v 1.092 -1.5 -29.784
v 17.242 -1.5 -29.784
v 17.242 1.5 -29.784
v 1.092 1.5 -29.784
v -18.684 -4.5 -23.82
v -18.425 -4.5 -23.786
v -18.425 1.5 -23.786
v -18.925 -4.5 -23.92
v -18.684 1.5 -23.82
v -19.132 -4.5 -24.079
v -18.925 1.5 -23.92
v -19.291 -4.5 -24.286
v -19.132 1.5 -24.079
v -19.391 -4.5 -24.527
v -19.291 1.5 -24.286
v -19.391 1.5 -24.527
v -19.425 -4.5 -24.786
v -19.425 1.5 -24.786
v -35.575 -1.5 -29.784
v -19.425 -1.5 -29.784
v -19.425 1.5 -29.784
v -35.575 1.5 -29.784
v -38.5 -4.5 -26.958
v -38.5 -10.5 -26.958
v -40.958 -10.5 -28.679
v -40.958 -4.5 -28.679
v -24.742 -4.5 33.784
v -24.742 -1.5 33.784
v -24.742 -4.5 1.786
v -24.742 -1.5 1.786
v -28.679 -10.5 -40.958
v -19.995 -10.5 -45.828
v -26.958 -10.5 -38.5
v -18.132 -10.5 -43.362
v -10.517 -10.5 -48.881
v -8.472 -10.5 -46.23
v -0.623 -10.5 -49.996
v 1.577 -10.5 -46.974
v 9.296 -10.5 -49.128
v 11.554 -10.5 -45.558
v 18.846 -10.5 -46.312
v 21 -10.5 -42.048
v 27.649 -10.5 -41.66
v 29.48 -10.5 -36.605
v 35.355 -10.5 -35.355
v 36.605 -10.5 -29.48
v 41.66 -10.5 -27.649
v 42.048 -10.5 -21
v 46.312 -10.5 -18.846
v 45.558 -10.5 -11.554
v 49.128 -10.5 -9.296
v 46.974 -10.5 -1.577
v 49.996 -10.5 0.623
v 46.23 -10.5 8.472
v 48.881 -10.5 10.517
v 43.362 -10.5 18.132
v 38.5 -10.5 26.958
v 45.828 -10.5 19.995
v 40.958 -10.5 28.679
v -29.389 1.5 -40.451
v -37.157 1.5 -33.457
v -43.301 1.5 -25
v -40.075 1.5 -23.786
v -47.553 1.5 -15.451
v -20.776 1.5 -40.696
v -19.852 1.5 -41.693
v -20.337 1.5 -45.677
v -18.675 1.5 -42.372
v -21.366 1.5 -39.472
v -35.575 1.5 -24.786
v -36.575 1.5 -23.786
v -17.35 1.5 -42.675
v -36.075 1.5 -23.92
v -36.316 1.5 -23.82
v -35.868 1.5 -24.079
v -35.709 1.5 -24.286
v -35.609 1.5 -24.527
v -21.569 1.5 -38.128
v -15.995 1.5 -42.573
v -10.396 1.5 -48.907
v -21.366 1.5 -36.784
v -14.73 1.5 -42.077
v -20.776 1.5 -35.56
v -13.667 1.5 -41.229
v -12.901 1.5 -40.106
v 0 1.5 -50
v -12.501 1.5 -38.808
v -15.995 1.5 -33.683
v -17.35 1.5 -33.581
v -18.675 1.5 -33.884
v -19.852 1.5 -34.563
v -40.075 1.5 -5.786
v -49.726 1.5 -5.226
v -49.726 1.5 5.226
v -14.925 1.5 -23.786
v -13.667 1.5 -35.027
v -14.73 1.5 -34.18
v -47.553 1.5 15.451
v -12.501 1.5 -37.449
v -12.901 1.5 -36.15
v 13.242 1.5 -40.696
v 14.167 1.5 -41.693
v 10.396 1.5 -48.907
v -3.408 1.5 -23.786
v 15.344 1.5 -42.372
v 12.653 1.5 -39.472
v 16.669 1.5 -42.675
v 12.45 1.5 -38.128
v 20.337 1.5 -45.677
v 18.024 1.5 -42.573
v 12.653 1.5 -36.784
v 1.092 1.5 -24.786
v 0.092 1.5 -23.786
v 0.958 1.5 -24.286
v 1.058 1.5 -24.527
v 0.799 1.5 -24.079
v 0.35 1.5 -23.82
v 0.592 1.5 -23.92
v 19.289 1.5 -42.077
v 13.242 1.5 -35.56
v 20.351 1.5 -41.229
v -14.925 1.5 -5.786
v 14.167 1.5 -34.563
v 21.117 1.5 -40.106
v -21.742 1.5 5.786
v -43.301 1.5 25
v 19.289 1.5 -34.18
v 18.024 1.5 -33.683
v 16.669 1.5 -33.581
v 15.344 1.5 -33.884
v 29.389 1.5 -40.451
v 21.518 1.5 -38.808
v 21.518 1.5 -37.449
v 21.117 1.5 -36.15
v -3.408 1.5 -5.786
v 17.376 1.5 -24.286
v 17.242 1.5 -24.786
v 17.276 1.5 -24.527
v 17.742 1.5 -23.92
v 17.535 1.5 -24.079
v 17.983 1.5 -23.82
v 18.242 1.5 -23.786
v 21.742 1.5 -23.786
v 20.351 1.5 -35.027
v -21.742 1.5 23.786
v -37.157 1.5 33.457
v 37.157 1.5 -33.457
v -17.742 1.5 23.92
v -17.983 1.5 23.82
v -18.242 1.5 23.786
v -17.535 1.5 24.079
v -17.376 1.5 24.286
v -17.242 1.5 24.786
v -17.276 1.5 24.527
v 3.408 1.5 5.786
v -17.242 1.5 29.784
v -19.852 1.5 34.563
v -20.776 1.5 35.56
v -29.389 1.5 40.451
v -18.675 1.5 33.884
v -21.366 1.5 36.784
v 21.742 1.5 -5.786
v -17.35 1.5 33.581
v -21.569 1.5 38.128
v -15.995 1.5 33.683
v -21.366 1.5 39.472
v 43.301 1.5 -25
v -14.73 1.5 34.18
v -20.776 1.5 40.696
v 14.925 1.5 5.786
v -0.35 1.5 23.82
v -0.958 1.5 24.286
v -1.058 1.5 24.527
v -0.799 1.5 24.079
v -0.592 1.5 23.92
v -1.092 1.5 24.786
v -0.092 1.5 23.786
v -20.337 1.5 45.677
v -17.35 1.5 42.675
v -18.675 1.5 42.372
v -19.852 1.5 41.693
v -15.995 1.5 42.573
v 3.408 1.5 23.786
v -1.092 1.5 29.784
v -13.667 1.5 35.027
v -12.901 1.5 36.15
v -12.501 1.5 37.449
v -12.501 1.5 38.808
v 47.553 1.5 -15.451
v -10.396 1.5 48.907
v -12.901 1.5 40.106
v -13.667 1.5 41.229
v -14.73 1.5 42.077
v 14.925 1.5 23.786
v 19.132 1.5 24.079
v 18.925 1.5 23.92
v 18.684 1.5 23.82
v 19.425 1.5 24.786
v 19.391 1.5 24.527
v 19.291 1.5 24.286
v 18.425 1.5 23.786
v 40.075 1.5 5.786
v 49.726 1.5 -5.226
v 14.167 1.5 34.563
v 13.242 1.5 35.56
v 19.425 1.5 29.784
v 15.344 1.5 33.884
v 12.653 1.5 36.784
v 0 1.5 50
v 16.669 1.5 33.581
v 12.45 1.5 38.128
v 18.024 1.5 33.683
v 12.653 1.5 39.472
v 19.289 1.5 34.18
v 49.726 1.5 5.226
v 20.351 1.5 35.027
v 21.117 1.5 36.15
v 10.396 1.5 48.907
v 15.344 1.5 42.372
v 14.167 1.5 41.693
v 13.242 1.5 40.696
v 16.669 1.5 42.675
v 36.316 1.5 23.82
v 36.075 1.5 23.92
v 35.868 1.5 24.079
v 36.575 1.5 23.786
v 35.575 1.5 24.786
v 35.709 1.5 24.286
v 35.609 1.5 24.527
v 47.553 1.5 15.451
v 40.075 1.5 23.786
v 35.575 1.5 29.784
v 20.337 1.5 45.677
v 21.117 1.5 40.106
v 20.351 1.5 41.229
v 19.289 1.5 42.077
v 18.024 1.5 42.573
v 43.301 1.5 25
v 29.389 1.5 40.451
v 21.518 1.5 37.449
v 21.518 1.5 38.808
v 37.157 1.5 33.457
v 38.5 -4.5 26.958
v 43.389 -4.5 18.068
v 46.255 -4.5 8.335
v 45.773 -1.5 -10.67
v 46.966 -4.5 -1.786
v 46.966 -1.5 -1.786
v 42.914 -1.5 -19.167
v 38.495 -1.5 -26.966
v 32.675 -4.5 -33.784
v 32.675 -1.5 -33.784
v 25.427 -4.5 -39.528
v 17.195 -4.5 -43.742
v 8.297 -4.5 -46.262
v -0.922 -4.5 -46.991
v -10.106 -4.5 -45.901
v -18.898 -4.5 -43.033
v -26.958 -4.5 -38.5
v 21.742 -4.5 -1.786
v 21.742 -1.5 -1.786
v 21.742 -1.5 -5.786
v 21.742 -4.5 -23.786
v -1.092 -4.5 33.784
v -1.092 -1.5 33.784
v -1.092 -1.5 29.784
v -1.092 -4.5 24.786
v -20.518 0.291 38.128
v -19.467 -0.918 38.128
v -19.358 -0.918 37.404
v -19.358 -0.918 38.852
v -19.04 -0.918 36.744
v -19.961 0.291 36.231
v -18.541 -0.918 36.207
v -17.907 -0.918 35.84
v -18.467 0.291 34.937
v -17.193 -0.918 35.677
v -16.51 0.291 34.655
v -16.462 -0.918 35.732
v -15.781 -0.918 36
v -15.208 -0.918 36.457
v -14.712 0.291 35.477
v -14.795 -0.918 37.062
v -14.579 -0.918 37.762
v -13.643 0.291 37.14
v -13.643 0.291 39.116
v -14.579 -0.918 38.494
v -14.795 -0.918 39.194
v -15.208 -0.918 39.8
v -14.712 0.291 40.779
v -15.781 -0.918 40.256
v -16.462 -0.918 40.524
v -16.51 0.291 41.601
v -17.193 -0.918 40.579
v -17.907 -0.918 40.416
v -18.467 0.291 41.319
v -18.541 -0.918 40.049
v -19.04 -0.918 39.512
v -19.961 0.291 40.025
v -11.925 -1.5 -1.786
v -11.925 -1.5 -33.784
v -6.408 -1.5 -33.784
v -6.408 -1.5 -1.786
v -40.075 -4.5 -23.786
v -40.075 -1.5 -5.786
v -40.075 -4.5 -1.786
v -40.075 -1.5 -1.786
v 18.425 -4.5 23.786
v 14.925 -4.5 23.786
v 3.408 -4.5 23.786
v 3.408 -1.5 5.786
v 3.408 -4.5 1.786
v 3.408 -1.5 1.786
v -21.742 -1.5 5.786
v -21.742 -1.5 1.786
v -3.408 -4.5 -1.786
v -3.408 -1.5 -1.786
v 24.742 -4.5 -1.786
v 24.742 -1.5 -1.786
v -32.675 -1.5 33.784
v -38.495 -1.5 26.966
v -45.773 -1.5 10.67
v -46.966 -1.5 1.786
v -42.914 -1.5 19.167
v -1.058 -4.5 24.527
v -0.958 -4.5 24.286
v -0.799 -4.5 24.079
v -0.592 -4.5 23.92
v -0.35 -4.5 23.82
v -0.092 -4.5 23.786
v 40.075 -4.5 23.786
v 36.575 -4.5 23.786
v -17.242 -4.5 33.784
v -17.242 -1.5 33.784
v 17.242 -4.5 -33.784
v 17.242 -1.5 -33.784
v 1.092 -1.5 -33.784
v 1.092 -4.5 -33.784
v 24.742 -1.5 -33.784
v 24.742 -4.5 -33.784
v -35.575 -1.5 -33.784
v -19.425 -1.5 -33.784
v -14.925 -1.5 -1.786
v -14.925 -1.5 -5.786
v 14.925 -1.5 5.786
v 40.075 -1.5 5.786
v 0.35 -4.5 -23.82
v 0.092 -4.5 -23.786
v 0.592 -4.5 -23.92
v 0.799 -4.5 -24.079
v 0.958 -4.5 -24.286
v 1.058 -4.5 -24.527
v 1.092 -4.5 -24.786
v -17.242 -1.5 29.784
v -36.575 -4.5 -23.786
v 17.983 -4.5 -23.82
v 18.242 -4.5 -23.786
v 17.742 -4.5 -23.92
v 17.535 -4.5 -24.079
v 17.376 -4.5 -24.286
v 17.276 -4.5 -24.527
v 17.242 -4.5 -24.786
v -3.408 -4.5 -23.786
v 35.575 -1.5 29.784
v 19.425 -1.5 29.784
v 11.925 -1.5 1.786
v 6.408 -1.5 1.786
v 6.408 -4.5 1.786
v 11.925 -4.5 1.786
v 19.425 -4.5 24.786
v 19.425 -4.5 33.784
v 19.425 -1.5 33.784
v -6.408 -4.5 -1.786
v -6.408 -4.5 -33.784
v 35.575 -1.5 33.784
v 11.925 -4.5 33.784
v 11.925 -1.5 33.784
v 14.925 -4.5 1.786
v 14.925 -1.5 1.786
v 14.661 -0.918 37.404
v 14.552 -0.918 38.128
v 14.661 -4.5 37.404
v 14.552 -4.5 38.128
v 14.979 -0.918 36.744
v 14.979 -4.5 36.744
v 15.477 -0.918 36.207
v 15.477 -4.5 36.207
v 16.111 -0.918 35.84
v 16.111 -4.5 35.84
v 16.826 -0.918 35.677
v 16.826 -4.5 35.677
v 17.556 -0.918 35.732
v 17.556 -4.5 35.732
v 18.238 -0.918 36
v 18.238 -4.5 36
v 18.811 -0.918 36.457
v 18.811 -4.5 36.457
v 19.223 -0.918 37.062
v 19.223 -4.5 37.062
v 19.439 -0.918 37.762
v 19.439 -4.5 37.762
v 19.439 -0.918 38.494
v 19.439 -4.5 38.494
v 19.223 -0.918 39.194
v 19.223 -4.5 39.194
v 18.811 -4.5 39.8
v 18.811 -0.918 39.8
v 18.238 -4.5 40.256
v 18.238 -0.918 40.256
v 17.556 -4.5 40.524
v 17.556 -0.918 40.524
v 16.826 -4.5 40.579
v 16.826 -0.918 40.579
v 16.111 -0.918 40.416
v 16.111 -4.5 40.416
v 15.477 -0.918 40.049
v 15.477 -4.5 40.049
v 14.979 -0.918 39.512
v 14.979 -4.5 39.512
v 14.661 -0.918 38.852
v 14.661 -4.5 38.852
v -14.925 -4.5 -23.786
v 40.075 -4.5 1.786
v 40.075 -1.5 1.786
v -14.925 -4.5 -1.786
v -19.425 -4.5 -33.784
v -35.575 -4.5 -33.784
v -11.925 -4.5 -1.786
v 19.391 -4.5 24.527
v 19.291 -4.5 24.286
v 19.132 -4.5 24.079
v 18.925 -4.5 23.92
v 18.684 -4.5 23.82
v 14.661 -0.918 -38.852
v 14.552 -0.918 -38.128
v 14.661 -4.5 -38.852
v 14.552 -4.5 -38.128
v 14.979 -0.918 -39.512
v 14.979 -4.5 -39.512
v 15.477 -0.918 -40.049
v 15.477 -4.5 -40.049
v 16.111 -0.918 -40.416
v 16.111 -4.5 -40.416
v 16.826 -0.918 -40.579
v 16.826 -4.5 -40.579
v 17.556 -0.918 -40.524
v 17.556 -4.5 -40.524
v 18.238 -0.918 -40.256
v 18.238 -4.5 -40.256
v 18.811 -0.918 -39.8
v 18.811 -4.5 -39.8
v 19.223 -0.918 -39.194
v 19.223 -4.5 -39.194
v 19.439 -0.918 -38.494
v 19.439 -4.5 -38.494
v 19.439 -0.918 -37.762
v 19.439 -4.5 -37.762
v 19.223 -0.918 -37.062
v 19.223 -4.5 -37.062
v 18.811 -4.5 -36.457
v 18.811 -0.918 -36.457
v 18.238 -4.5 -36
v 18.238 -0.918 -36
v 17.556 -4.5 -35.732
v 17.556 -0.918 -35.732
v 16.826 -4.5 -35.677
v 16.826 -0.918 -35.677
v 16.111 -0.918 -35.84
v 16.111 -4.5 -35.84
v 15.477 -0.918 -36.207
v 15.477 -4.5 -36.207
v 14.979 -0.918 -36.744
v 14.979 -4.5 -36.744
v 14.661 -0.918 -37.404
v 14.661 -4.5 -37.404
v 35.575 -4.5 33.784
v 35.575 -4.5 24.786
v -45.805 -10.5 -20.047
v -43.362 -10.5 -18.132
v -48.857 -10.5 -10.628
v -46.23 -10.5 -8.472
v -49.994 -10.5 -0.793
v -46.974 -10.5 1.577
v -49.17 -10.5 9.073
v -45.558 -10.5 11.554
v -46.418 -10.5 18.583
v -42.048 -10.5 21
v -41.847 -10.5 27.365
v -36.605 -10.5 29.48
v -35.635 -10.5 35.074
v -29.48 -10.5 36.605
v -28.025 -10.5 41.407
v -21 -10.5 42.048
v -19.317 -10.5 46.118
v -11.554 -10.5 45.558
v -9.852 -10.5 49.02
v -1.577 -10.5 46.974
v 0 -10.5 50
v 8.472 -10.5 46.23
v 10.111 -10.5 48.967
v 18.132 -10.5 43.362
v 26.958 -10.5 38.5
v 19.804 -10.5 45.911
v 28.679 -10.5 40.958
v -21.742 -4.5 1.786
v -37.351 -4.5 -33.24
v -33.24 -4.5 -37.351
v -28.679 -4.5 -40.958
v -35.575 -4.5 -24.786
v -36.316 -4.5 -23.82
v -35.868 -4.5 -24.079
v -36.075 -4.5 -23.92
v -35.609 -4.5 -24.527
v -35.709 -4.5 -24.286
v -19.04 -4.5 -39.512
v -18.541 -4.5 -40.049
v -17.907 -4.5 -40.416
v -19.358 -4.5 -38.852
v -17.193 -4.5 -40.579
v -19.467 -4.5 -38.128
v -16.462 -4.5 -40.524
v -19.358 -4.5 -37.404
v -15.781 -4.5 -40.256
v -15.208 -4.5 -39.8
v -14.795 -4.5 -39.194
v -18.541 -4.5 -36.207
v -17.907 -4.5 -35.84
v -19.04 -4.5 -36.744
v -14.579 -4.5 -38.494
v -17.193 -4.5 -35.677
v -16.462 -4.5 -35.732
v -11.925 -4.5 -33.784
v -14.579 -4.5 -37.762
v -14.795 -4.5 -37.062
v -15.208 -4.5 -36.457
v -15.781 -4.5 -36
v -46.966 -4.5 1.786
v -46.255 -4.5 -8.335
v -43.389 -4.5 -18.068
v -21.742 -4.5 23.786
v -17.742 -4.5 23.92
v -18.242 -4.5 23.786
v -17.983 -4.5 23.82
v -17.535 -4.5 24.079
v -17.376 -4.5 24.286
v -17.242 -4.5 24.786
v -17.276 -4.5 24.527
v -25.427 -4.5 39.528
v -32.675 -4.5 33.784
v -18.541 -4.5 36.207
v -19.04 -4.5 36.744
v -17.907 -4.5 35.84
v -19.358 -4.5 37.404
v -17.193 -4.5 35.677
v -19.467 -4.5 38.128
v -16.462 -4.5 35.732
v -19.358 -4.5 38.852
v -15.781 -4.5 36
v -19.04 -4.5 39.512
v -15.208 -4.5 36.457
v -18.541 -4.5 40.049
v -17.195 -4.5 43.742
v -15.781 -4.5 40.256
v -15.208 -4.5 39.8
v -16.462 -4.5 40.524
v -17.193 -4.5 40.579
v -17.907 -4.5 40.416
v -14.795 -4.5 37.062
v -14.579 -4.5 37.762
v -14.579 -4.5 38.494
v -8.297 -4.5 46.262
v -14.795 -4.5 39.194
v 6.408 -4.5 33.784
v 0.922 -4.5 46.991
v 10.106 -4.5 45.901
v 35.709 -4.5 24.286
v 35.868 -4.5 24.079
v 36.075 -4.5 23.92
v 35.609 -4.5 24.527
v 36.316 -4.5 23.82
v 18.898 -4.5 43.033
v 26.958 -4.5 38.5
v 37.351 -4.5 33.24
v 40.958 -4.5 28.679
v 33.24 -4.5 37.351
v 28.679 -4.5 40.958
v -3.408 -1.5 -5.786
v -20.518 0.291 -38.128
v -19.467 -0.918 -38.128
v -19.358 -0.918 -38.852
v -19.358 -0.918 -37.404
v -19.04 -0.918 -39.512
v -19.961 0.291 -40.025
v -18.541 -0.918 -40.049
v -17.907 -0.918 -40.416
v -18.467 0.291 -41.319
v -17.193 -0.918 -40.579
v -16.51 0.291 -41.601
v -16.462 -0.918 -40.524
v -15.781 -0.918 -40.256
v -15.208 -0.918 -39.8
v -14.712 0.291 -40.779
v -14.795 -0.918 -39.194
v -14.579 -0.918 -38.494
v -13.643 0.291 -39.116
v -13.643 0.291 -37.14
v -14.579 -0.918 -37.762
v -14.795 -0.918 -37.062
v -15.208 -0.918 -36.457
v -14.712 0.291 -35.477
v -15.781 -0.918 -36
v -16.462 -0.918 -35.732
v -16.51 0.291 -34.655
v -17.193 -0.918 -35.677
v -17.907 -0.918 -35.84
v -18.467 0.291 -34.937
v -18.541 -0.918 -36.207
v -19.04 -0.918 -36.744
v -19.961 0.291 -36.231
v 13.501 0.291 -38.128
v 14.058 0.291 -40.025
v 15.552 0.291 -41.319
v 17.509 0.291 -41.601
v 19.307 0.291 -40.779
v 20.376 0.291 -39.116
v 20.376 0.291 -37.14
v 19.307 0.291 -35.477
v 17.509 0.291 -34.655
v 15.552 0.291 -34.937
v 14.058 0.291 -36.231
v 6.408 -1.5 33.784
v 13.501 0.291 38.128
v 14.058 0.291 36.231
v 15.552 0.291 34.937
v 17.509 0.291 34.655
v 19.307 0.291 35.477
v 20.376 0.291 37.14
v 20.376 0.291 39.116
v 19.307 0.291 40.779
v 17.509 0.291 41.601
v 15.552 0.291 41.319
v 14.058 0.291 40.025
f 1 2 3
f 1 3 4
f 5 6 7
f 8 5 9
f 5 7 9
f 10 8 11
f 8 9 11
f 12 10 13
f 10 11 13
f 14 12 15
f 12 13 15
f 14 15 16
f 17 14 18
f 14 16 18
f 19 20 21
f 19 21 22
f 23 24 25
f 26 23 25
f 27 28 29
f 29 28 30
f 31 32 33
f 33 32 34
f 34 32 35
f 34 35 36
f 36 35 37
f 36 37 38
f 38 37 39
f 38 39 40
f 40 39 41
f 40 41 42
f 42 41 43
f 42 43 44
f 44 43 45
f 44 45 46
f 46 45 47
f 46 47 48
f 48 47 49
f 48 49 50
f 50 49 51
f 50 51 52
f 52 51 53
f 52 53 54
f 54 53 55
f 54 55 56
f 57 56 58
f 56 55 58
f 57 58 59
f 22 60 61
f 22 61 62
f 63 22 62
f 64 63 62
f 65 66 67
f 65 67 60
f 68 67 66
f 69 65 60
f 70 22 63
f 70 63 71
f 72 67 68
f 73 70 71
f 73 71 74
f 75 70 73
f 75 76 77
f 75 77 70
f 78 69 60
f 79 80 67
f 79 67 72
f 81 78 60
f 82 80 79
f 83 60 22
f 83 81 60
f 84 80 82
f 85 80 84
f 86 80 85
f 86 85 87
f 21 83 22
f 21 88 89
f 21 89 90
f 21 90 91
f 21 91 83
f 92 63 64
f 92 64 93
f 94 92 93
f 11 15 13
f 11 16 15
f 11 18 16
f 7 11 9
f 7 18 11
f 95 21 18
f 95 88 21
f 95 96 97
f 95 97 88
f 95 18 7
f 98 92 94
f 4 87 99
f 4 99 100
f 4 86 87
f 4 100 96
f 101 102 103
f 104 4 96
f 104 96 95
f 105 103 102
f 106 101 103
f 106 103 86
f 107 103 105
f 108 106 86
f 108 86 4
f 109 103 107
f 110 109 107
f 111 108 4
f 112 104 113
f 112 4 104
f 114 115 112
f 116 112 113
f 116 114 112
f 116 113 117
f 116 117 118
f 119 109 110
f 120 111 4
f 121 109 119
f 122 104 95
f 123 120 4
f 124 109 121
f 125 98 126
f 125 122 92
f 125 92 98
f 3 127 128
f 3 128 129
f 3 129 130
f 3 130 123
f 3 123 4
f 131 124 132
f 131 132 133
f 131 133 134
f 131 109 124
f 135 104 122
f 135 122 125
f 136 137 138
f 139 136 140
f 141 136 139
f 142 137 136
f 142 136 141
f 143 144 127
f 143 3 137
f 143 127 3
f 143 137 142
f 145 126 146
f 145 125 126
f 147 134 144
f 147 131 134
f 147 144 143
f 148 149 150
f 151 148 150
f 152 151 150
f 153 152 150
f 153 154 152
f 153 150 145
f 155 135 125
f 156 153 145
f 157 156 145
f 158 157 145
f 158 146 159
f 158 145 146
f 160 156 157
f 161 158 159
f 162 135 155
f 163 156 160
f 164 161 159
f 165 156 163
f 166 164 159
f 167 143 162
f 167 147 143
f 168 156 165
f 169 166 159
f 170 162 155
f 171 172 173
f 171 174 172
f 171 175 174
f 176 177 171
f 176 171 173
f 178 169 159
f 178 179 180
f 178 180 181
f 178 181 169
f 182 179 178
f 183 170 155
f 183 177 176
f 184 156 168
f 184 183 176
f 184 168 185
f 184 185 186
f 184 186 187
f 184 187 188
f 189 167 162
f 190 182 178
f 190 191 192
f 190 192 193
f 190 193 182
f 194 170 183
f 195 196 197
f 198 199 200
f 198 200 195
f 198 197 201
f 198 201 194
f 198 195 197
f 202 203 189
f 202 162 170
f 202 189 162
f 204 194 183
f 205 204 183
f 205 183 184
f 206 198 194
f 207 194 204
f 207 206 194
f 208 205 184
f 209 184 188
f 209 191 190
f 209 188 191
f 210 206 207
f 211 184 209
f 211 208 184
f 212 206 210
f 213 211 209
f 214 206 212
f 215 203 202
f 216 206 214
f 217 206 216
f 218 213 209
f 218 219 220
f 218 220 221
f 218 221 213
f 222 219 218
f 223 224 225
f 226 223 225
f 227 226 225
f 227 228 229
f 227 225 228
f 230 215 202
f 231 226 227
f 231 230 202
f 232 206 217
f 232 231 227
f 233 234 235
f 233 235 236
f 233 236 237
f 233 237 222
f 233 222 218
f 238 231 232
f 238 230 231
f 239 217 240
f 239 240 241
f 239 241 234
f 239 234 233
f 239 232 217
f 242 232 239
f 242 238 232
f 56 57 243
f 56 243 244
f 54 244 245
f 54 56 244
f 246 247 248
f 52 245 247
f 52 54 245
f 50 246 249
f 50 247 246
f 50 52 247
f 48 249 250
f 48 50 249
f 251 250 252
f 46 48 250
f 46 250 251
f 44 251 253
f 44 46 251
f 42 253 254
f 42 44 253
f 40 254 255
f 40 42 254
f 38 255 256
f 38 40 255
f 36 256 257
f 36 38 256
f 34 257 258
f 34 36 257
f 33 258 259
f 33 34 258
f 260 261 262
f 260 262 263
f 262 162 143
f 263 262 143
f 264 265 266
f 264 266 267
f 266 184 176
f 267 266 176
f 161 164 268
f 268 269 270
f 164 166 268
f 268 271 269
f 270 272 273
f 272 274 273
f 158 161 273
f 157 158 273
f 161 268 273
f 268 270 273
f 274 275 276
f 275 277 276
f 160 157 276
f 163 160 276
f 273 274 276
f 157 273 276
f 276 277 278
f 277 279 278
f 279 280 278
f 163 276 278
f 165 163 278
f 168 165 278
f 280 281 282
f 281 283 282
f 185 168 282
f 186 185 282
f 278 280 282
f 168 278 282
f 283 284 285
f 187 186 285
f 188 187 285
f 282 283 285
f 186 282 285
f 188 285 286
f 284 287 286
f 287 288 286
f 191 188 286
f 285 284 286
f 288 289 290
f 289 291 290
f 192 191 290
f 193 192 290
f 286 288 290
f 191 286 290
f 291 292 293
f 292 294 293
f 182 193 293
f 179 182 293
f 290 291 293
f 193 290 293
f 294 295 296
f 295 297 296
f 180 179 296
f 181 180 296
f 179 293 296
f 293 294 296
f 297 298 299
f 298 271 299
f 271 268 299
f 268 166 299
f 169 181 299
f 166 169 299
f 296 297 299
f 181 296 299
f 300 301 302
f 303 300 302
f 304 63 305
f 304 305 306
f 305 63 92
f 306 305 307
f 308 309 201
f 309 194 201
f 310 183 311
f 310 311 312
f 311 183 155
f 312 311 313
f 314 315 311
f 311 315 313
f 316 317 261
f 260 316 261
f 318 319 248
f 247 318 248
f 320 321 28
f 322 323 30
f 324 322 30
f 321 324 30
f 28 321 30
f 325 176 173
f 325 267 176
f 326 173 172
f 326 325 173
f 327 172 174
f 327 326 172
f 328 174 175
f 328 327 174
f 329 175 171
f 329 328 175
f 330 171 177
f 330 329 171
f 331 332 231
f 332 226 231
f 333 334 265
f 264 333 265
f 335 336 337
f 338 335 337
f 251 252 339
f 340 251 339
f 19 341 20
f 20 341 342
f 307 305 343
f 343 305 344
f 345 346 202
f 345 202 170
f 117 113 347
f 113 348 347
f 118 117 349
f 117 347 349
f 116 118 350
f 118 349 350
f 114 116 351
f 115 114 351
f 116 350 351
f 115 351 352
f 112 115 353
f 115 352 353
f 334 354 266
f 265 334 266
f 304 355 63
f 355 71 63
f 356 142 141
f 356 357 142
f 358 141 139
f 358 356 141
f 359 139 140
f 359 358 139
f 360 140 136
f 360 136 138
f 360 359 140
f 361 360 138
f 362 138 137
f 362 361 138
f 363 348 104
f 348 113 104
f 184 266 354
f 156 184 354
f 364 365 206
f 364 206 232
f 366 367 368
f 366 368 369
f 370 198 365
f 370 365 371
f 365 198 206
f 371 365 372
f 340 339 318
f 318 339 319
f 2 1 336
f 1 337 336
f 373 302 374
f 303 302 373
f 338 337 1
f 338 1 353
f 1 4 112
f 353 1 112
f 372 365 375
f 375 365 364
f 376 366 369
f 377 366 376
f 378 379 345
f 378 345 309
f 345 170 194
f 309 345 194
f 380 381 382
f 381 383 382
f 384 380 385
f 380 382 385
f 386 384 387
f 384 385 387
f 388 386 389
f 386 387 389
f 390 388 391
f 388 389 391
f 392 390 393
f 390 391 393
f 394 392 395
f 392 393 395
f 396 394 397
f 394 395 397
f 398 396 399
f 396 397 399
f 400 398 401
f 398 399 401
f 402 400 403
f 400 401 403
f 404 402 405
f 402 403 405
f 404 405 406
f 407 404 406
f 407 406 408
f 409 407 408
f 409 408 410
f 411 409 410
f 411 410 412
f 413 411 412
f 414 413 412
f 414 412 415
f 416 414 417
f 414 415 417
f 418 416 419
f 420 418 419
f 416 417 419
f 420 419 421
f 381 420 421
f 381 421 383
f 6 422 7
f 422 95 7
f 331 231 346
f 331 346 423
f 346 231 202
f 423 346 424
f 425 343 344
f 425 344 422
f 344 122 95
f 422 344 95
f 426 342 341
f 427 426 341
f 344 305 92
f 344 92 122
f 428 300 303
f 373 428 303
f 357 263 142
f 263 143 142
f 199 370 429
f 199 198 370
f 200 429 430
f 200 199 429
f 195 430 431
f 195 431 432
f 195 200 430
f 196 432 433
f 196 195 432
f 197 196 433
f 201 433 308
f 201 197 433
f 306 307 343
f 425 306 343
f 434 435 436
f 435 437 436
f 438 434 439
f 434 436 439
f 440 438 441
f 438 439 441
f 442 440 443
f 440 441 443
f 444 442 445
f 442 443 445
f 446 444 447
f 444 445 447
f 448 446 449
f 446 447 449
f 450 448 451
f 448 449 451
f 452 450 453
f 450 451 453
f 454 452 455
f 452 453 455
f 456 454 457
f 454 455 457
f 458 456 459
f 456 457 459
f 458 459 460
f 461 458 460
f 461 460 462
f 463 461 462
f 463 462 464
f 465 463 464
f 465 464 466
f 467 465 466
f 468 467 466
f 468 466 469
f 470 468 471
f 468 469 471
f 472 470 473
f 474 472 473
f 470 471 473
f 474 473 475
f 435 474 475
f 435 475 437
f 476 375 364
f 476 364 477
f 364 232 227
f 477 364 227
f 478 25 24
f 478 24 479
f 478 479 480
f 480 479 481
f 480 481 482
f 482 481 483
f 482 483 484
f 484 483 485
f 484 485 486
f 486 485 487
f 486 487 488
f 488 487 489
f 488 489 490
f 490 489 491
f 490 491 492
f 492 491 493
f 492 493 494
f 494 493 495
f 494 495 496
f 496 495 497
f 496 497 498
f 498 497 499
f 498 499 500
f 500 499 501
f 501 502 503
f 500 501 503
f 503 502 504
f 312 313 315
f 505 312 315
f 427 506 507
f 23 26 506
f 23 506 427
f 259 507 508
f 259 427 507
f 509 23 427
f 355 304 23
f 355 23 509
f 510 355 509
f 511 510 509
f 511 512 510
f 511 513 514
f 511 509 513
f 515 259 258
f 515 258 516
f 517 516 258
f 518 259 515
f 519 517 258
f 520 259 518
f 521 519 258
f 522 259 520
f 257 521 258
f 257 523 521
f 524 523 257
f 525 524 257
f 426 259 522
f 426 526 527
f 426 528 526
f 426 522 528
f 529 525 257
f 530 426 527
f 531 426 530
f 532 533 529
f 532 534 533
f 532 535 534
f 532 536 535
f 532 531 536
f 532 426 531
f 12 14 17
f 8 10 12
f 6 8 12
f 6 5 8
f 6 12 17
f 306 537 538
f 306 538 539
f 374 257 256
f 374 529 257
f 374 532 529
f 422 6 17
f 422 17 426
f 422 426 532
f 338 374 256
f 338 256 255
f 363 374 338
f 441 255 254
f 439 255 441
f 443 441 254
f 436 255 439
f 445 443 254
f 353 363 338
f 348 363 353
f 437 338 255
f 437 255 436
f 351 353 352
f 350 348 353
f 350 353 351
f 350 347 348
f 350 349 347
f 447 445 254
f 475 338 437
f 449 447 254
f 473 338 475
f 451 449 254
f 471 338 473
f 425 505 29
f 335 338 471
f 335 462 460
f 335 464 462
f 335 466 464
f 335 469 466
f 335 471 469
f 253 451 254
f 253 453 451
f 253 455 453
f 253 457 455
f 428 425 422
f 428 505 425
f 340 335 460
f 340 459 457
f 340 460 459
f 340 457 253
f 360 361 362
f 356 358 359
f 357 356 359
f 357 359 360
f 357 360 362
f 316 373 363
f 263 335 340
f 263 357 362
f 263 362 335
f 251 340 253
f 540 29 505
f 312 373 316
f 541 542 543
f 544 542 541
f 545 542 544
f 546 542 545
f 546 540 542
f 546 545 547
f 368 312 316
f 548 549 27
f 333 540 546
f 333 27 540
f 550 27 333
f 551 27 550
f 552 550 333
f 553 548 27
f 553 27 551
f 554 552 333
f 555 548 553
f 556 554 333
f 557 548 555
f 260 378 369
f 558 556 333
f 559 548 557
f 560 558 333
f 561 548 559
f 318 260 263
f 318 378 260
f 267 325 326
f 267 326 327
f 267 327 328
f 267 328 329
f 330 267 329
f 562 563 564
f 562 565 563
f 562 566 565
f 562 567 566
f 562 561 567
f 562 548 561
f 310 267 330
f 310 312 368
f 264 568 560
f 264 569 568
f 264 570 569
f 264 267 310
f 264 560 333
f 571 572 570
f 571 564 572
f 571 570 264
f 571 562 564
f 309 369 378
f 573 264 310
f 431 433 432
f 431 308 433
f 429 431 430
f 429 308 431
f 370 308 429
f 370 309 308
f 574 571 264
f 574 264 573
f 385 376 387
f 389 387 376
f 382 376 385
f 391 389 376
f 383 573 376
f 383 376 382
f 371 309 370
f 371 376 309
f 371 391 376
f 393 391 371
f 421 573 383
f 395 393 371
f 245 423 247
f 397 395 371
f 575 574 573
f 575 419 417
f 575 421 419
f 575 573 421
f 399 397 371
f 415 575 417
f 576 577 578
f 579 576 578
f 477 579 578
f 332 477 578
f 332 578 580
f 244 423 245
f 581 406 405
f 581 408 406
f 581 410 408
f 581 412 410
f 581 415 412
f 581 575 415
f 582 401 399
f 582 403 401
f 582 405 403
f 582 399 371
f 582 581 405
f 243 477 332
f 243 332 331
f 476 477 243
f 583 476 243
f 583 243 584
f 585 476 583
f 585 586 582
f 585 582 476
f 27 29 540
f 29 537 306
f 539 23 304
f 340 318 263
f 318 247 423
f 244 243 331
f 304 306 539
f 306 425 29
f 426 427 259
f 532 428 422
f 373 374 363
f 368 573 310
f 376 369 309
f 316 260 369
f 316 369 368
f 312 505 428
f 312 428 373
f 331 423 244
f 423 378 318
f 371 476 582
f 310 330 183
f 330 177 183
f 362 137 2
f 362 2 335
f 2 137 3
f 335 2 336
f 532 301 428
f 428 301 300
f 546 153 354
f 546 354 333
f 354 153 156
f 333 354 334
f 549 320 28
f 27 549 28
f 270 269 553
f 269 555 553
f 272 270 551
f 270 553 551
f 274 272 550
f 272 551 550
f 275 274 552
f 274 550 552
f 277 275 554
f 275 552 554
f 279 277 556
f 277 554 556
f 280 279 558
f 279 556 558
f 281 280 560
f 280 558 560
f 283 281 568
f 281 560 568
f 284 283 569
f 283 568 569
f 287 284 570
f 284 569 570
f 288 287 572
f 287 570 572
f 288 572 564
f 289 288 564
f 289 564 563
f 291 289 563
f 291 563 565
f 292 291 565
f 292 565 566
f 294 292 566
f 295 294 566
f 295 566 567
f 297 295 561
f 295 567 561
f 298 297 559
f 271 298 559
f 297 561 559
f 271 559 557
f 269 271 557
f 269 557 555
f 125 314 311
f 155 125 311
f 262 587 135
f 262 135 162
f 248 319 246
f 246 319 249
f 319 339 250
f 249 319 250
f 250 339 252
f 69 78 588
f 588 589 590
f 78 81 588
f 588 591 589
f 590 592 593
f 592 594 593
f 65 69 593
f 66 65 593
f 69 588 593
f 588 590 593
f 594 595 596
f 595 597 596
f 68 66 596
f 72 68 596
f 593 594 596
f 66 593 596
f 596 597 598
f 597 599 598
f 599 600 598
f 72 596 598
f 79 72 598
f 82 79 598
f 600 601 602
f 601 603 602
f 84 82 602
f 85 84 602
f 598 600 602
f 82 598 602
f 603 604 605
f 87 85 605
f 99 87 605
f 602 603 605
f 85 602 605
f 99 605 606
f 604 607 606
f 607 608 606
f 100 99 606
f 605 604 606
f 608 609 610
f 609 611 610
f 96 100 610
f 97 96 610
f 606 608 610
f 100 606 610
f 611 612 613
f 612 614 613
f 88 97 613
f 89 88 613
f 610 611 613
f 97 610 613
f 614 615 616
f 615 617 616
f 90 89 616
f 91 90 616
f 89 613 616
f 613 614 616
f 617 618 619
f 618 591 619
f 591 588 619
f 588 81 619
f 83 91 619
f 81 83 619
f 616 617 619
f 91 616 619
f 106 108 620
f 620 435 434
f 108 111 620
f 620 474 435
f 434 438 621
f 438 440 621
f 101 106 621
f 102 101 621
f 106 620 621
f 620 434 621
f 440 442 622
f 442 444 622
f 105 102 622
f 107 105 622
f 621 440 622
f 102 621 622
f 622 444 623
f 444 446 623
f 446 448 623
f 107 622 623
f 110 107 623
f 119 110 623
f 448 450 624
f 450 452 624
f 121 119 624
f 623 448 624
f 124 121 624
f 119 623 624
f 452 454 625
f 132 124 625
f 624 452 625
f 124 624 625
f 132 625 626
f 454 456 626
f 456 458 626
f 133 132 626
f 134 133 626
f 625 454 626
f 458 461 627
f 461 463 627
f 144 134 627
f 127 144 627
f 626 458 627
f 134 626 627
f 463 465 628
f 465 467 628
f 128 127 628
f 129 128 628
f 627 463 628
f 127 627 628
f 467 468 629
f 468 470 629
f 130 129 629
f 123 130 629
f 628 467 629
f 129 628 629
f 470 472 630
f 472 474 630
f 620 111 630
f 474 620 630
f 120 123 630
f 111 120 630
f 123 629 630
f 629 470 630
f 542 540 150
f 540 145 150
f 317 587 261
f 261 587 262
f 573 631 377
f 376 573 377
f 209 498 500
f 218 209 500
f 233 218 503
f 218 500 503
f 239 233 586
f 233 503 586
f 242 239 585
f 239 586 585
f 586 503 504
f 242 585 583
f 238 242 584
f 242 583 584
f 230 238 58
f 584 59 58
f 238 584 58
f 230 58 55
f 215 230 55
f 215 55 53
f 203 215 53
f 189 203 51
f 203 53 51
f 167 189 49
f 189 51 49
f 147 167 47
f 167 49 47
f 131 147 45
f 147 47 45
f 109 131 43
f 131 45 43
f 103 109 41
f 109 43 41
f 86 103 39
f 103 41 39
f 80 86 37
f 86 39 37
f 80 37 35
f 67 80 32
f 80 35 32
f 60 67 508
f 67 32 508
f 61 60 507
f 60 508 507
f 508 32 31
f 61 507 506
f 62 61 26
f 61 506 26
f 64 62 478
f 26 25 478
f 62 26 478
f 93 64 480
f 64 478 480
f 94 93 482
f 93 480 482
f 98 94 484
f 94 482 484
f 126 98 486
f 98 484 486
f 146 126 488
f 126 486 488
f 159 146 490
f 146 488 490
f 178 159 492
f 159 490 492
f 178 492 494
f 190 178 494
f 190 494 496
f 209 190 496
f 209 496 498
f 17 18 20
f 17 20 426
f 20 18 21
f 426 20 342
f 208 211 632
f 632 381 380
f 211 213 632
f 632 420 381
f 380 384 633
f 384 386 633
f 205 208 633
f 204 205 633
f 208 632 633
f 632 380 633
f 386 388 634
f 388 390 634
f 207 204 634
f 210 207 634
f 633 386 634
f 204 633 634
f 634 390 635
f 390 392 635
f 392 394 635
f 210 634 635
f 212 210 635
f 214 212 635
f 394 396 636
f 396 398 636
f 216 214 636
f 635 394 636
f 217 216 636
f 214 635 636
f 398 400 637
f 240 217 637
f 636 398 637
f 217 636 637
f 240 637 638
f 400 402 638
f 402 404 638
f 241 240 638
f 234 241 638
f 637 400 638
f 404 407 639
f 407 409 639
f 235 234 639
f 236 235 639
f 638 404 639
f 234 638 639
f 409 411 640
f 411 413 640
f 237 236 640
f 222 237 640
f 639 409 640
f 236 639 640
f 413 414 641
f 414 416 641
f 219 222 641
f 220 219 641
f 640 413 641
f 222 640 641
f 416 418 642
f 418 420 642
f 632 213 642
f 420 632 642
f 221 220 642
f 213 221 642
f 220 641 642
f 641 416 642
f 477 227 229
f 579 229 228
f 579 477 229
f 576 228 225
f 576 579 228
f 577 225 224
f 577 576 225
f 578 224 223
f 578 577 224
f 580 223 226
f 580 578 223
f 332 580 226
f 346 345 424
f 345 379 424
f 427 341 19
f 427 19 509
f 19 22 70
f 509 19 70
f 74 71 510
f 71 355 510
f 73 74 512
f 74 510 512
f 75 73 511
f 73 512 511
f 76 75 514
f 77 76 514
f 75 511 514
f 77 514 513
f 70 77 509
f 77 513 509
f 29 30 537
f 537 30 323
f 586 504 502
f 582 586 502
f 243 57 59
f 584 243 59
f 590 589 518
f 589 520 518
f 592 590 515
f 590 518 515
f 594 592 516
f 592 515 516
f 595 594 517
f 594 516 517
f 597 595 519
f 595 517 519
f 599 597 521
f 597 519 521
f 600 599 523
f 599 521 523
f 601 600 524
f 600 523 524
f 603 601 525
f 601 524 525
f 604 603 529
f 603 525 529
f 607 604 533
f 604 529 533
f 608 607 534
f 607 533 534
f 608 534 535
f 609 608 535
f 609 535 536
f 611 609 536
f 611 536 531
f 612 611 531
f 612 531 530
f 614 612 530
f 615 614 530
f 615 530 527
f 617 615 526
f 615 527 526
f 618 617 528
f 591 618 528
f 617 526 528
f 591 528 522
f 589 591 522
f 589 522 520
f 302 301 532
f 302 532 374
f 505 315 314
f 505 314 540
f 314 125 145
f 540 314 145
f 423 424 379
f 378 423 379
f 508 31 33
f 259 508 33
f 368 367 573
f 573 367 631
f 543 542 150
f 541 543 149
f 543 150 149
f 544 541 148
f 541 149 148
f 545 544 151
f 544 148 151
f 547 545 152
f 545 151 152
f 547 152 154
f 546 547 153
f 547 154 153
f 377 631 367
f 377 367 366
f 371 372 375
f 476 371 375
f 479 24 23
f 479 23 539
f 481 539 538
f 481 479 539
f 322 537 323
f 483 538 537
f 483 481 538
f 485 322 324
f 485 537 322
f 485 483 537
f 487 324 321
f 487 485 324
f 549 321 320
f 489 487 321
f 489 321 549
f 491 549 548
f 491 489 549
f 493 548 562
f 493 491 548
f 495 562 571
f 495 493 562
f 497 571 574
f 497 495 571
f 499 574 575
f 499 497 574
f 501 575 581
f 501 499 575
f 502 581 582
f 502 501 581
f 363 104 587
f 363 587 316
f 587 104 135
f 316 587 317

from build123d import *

# Parameters (mm, degrees)
A_BASE_T_START                                    = -1.5
A_BASE_T_OUTLINE_R                                = 47
A_BASE_T_OUTLINE_R_2                              = 1
A_BASE_T_DEPTH                                    = 3
OUTER_START                                       = -12
SKETCH2_R                                         = 50
SKETCH2_R_2                                       = 47
OUTER_RING_DEPTH                                  = 12
FINGER_BASE_THROUGH_HOLES_DEPTH                   = 72.281133549
RING_EXTRUDE_OUTLINE_R                            = 1
RING_EXTRUDE_OUTLINE_W                            = 5.516666665
RING_EXTRUDE_OUTLINE_H                            = 31.998521247
RING_EXTRUDE_OUTLINE_W_2                          = 5.516666664
RING_EXTRUDE_DEPTH                                = 3
SKETCH6_W                                         = 16.15
SKETCH6_H                                         = 4
ALLOWANCE_CUT_1_DEPTH                             = 72.281133549
ALLOWANCE_CUT_2_DEPTH                             = 6
CSK_FOR_8_FLAT_HEAD_SOCKET_CAP_SCREW1_D           = 4.9149
CSK_FOR_8_FLAT_HEAD_SOCKET_CAP_SCREW1_CSINK_D     = 9.1186
CSK_FOR_8_FLAT_HEAD_SOCKET_CAP_SCREW1_CSINK_ANGLE = 82
CLEARANCE_CONTOURING_R                            = 1


# Read off the part's stored shape, not the designer's step: a_base_t, Ring Extrude
with BuildPart() as part:
    # a_base_t outline → a_base_t (new body)
    with BuildSketch(Plane(origin=(0, 0, 0), x_dir=(1, 0, 0), z_dir=(0, 1, 0)).offset(A_BASE_T_START)):
        Circle(A_BASE_T_OUTLINE_R)
        with Locations((-17.009259258, -38.128042167)):
            Circle(A_BASE_T_OUTLINE_R_2, mode=Mode.SUBTRACT)
        with Locations((-9.166666665, -28.284271247)):
            Circle(A_BASE_T_OUTLINE_R_2, mode=Mode.SUBTRACT)
        with Locations((17.009259258, -38.128042167)):
            Circle(A_BASE_T_OUTLINE_R_2, mode=Mode.SUBTRACT)
        with Locations((27.5, -28.284271247)):
            Circle(A_BASE_T_OUTLINE_R_2, mode=Mode.SUBTRACT)
        with Locations((-27.5, 28.284271247)):
            Circle(A_BASE_T_OUTLINE_R_2, mode=Mode.SUBTRACT)
        with Locations((-17.009259258, 38.128042167)):
            Circle(A_BASE_T_OUTLINE_R_2, mode=Mode.SUBTRACT)
        with Locations((9.166666665, 28.284271247)):
            Circle(A_BASE_T_OUTLINE_R_2, mode=Mode.SUBTRACT)
        with Locations((17.009259258, 38.128042167)):
            Circle(A_BASE_T_OUTLINE_R_2, mode=Mode.SUBTRACT)
    extrude(amount=A_BASE_T_DEPTH)

    # Sketch2 → Outer Ring (add)
    with BuildSketch(Plane(origin=(0, 1.5, 0), x_dir=(1, 0, 0), z_dir=(0, 1, 0)).offset(OUTER_START)):
        with Locations(Location((0, 0, 0), (0, 0, 270))):
            Circle(SKETCH2_R)
        with Locations(Location((0, 0, 0), (0, 0, 270))):
            Circle(SKETCH2_R_2, mode=Mode.SUBTRACT)
    extrude(amount=OUTER_RING_DEPTH)

    # Sketch3 → Finger Base Through Holes (cut, through all)
    with BuildSketch(Plane.XZ.offset(1.5)):
        Polygon((35.574999997, 23.78575), (40.074999997, 23.78575), (40.074999997, 5.78575), (14.924999997, 5.78575), (14.924999997, 23.78575), (19.424999997, 23.78575), (19.424999997, 29.784271247), (35.574999997, 29.784271247), align=None)
        Polygon((-1.091666667, 29.784271247), (-17.241666667, 29.784271247), (-17.241666667, 23.78575), (-21.741666667, 23.78575), (-21.741666667, 5.78575), (3.408333333, 5.78575), (3.408333333, 23.78575), (-1.091666667, 23.78575), align=None)
        Polygon((17.241666665, -29.784271247), (1.091666665, -29.784271247), (1.091666665, -23.78575), (-3.408333335, -23.78575), (-3.408333335, -5.78575), (21.741666665, -5.78575), (21.741666665, -23.78575), (17.241666665, -23.78575), align=None)
        Polygon((-19.425, -29.784271247), (-35.575, -29.784271247), (-35.575, -23.78575), (-40.075, -23.78575), (-40.075, -5.78575), (-14.925, -5.78575), (-14.925, -23.78575), (-19.425, -23.78575), align=None)
    extrude(amount=-FINGER_BASE_THROUGH_HOLES_DEPTH, mode=Mode.SUBTRACT)

    # Ring Extrude outline → Ring Extrude (add)
    with BuildSketch(Plane.XZ.offset(1.5)):
        with BuildLine():
            Line((35.574999997, 30.715132674), (35.574999997, 23.78575))
            Line((35.574999997, 23.78575), (40.074999997, 23.78575))
            Line((40.074999997, 23.78575), (40.074999997, 1.78575))
            Line((40.074999997, 1.78575), (14.924999997, 1.78575))
            Line((14.924999997, 1.78575), (14.924999997, 23.78575))
            Line((14.924999997, 23.78575), (19.424999997, 23.78575))
            Line((19.424999997, 23.78575), (19.424999997, 33.784271247))
            Line((19.424999997, 33.784271247), (32.67450101, 33.784271247))
            ThreePointArc((32.67450101, 33.784271247), (0, 47), (-32.67450101, 33.784271247))
            Line((-32.67450101, 33.784271247), (-24.741666667, 33.784271247))
            Line((-24.741666667, 33.784271247), (-24.741666667, 1.78575))
            Line((-24.741666667, 1.78575), (-46.966063247, 1.78575))
            ThreePointArc((-46.966063247, 1.78575), (-44.354634753, -15.545622403), (-35.575, -30.715132671))
            Line((-35.575, -30.715132671), (-35.575, -23.78575))
            Line((-35.575, -23.78575), (-40.075, -23.78575))
            Line((-40.075, -23.78575), (-40.075, -1.78575))
            Line((-40.075, -1.78575), (-14.925, -1.78575))
            Line((-14.925, -1.78575), (-14.925, -23.78575))
            Line((-14.925, -23.78575), (-19.425, -23.78575))
            Line((-19.425, -23.78575), (-19.425, -33.784271247))
            Line((-19.425, -33.784271247), (-32.67450101, -33.784271247))
            ThreePointArc((-32.67450101, -33.784271247), (0, -47), (32.67450101, -33.784271247))
            Line((32.67450101, -33.784271247), (24.741666665, -33.784271247))
            Line((24.741666665, -33.784271247), (24.741666665, -1.78575))
            Line((24.741666665, -1.78575), (46.966063247, -1.78575))
            ThreePointArc((46.966063247, -1.78575), (44.354634753, 15.545622405), (35.574999997, 30.715132674))
        make_face()
        with Locations((-17.009259258, -38.128042167)):
            Circle(RING_EXTRUDE_OUTLINE_R, mode=Mode.SUBTRACT)
        with Locations((-9.166666667, -17.785010623)):
            Rectangle(RING_EXTRUDE_OUTLINE_W, RING_EXTRUDE_OUTLINE_H, mode=Mode.SUBTRACT)
        with Locations((17.009259258, -38.128042167)):
            Circle(RING_EXTRUDE_OUTLINE_R, mode=Mode.SUBTRACT)
        Polygon((17.241666665, -23.78575), (17.241666665, -33.784271247), (1.091666665, -33.784271247), (1.091666665, -23.78575), (-3.408333335, -23.78575), (-3.408333335, -1.78575), (21.741666665, -1.78575), (21.741666665, -23.78575), align=None, mode=Mode.SUBTRACT)
        Polygon((-1.091666667, 23.78575), (3.408333333, 23.78575), (3.408333333, 1.78575), (-21.741666667, 1.78575), (-21.741666667, 23.78575), (-17.241666667, 23.78575), (-17.241666667, 33.784271247), (-1.091666667, 33.784271247), align=None, mode=Mode.SUBTRACT)
        with Locations((-17.009259258, 38.128042167)):
            Circle(RING_EXTRUDE_OUTLINE_R, mode=Mode.SUBTRACT)
        with Locations((9.166666665, 17.785010623)):
            Rectangle(RING_EXTRUDE_OUTLINE_W_2, RING_EXTRUDE_OUTLINE_H, mode=Mode.SUBTRACT)
        with Locations((17.009259258, 38.128042167)):
            Circle(RING_EXTRUDE_OUTLINE_R, mode=Mode.SUBTRACT)
    extrude(amount=RING_EXTRUDE_DEPTH)

    # Sketch6 → Allowance Cut 1 (cut, through all)
    with BuildSketch(Plane.XZ.offset(1.5)):
        with Locations((27.499999997, 31.784271247)):
            Rectangle(SKETCH6_W, SKETCH6_H)
        with Locations((-27.5, -31.784271247)):
            Rectangle(SKETCH6_W, SKETCH6_H)
    extrude(amount=ALLOWANCE_CUT_1_DEPTH, mode=Mode.SUBTRACT)

    # Sketch7 → Allowance Cut 2 (cut)
    with BuildSketch(Plane.XZ.offset(10.5)):
        with BuildLine():
            Line((-38.500146082, -26.958092508), (-40.957602214, -28.678821818))
            ThreePointArc((-40.957602214, -28.678821818), (-35.355339059, -35.355339059), (-28.678821818, -40.957602214))
            Line((-28.678821818, -40.957602214), (-26.958092508, -38.500146082))
            ThreePointArc((-26.958092508, -38.500146082), (-29.909386843, -36.25504901), (-32.67450101, -33.784271247))
            Line((-32.67450101, -33.784271247), (-35.575, -33.784271247))
            Line((-35.575, -33.784271247), (-35.575, -30.715132671))
            ThreePointArc((-35.575, -30.715132671), (-37.085181063, -28.873679114), (-38.500146082, -26.958092508))
        make_face()
        with BuildLine():
            ThreePointArc((40.957602214, 28.678821818), (35.355339059, 35.355339059), (28.678821818, 40.957602214))
            Line((28.678821818, 40.957602214), (26.958092508, 38.500146082))
            ThreePointArc((26.958092508, 38.500146082), (29.909386843, 36.25504901), (32.67450101, 33.784271247))
            Line((32.67450101, 33.784271247), (35.574999997, 33.784271247))
            Line((35.574999997, 33.784271247), (35.574999997, 30.715132674))
            ThreePointArc((35.574999997, 30.715132674), (37.085181061, 28.873679115), (38.500146082, 26.958092508))
            Line((38.500146082, 26.958092508), (40.957602214, 28.678821818))
        make_face()
    extrude(amount=-ALLOWANCE_CUT_2_DEPTH, mode=Mode.SUBTRACT)

    # CSK for #8 Flat Head Socket Cap Screw1 (through all)
    with Locations(Plane(origin=(0, 1.5, 0), x_dir=(1, 0, 0), z_dir=(0, 1, 0))):
        with Locations((-17.009259258, -38.128042167), (17.009259258, -38.128042167), (17.009259258, 38.128042167), (-17.009259258, 38.128042167)):
            CounterSinkHole(CSK_FOR_8_FLAT_HEAD_SOCKET_CAP_SCREW1_D / 2, CSK_FOR_8_FLAT_HEAD_SOCKET_CAP_SCREW1_CSINK_D / 2, counter_sink_angle=CSK_FOR_8_FLAT_HEAD_SOCKET_CAP_SCREW1_CSINK_ANGLE)

    # Clearance Contouring
    clearance_contouring_edges = [part.edges().sort_by_distance(p)[0] for p in [
        (17.241666665, -1.5, -23.78575),
        (1.091666665, -1.5, -23.78575),
        (-19.425, -1.5, -23.78575),
        (-35.575, -1.5, -23.78575),
        (35.574999997, 0, 23.78575),
        (19.424999997, 0, 23.78575),
        (-1.091666667, 0, 23.78575),
        (-17.241666667, 0, 23.78575),
    ]]
    fillet(clearance_contouring_edges, radius=CLEARANCE_CONTOURING_R)


solid = part.part
